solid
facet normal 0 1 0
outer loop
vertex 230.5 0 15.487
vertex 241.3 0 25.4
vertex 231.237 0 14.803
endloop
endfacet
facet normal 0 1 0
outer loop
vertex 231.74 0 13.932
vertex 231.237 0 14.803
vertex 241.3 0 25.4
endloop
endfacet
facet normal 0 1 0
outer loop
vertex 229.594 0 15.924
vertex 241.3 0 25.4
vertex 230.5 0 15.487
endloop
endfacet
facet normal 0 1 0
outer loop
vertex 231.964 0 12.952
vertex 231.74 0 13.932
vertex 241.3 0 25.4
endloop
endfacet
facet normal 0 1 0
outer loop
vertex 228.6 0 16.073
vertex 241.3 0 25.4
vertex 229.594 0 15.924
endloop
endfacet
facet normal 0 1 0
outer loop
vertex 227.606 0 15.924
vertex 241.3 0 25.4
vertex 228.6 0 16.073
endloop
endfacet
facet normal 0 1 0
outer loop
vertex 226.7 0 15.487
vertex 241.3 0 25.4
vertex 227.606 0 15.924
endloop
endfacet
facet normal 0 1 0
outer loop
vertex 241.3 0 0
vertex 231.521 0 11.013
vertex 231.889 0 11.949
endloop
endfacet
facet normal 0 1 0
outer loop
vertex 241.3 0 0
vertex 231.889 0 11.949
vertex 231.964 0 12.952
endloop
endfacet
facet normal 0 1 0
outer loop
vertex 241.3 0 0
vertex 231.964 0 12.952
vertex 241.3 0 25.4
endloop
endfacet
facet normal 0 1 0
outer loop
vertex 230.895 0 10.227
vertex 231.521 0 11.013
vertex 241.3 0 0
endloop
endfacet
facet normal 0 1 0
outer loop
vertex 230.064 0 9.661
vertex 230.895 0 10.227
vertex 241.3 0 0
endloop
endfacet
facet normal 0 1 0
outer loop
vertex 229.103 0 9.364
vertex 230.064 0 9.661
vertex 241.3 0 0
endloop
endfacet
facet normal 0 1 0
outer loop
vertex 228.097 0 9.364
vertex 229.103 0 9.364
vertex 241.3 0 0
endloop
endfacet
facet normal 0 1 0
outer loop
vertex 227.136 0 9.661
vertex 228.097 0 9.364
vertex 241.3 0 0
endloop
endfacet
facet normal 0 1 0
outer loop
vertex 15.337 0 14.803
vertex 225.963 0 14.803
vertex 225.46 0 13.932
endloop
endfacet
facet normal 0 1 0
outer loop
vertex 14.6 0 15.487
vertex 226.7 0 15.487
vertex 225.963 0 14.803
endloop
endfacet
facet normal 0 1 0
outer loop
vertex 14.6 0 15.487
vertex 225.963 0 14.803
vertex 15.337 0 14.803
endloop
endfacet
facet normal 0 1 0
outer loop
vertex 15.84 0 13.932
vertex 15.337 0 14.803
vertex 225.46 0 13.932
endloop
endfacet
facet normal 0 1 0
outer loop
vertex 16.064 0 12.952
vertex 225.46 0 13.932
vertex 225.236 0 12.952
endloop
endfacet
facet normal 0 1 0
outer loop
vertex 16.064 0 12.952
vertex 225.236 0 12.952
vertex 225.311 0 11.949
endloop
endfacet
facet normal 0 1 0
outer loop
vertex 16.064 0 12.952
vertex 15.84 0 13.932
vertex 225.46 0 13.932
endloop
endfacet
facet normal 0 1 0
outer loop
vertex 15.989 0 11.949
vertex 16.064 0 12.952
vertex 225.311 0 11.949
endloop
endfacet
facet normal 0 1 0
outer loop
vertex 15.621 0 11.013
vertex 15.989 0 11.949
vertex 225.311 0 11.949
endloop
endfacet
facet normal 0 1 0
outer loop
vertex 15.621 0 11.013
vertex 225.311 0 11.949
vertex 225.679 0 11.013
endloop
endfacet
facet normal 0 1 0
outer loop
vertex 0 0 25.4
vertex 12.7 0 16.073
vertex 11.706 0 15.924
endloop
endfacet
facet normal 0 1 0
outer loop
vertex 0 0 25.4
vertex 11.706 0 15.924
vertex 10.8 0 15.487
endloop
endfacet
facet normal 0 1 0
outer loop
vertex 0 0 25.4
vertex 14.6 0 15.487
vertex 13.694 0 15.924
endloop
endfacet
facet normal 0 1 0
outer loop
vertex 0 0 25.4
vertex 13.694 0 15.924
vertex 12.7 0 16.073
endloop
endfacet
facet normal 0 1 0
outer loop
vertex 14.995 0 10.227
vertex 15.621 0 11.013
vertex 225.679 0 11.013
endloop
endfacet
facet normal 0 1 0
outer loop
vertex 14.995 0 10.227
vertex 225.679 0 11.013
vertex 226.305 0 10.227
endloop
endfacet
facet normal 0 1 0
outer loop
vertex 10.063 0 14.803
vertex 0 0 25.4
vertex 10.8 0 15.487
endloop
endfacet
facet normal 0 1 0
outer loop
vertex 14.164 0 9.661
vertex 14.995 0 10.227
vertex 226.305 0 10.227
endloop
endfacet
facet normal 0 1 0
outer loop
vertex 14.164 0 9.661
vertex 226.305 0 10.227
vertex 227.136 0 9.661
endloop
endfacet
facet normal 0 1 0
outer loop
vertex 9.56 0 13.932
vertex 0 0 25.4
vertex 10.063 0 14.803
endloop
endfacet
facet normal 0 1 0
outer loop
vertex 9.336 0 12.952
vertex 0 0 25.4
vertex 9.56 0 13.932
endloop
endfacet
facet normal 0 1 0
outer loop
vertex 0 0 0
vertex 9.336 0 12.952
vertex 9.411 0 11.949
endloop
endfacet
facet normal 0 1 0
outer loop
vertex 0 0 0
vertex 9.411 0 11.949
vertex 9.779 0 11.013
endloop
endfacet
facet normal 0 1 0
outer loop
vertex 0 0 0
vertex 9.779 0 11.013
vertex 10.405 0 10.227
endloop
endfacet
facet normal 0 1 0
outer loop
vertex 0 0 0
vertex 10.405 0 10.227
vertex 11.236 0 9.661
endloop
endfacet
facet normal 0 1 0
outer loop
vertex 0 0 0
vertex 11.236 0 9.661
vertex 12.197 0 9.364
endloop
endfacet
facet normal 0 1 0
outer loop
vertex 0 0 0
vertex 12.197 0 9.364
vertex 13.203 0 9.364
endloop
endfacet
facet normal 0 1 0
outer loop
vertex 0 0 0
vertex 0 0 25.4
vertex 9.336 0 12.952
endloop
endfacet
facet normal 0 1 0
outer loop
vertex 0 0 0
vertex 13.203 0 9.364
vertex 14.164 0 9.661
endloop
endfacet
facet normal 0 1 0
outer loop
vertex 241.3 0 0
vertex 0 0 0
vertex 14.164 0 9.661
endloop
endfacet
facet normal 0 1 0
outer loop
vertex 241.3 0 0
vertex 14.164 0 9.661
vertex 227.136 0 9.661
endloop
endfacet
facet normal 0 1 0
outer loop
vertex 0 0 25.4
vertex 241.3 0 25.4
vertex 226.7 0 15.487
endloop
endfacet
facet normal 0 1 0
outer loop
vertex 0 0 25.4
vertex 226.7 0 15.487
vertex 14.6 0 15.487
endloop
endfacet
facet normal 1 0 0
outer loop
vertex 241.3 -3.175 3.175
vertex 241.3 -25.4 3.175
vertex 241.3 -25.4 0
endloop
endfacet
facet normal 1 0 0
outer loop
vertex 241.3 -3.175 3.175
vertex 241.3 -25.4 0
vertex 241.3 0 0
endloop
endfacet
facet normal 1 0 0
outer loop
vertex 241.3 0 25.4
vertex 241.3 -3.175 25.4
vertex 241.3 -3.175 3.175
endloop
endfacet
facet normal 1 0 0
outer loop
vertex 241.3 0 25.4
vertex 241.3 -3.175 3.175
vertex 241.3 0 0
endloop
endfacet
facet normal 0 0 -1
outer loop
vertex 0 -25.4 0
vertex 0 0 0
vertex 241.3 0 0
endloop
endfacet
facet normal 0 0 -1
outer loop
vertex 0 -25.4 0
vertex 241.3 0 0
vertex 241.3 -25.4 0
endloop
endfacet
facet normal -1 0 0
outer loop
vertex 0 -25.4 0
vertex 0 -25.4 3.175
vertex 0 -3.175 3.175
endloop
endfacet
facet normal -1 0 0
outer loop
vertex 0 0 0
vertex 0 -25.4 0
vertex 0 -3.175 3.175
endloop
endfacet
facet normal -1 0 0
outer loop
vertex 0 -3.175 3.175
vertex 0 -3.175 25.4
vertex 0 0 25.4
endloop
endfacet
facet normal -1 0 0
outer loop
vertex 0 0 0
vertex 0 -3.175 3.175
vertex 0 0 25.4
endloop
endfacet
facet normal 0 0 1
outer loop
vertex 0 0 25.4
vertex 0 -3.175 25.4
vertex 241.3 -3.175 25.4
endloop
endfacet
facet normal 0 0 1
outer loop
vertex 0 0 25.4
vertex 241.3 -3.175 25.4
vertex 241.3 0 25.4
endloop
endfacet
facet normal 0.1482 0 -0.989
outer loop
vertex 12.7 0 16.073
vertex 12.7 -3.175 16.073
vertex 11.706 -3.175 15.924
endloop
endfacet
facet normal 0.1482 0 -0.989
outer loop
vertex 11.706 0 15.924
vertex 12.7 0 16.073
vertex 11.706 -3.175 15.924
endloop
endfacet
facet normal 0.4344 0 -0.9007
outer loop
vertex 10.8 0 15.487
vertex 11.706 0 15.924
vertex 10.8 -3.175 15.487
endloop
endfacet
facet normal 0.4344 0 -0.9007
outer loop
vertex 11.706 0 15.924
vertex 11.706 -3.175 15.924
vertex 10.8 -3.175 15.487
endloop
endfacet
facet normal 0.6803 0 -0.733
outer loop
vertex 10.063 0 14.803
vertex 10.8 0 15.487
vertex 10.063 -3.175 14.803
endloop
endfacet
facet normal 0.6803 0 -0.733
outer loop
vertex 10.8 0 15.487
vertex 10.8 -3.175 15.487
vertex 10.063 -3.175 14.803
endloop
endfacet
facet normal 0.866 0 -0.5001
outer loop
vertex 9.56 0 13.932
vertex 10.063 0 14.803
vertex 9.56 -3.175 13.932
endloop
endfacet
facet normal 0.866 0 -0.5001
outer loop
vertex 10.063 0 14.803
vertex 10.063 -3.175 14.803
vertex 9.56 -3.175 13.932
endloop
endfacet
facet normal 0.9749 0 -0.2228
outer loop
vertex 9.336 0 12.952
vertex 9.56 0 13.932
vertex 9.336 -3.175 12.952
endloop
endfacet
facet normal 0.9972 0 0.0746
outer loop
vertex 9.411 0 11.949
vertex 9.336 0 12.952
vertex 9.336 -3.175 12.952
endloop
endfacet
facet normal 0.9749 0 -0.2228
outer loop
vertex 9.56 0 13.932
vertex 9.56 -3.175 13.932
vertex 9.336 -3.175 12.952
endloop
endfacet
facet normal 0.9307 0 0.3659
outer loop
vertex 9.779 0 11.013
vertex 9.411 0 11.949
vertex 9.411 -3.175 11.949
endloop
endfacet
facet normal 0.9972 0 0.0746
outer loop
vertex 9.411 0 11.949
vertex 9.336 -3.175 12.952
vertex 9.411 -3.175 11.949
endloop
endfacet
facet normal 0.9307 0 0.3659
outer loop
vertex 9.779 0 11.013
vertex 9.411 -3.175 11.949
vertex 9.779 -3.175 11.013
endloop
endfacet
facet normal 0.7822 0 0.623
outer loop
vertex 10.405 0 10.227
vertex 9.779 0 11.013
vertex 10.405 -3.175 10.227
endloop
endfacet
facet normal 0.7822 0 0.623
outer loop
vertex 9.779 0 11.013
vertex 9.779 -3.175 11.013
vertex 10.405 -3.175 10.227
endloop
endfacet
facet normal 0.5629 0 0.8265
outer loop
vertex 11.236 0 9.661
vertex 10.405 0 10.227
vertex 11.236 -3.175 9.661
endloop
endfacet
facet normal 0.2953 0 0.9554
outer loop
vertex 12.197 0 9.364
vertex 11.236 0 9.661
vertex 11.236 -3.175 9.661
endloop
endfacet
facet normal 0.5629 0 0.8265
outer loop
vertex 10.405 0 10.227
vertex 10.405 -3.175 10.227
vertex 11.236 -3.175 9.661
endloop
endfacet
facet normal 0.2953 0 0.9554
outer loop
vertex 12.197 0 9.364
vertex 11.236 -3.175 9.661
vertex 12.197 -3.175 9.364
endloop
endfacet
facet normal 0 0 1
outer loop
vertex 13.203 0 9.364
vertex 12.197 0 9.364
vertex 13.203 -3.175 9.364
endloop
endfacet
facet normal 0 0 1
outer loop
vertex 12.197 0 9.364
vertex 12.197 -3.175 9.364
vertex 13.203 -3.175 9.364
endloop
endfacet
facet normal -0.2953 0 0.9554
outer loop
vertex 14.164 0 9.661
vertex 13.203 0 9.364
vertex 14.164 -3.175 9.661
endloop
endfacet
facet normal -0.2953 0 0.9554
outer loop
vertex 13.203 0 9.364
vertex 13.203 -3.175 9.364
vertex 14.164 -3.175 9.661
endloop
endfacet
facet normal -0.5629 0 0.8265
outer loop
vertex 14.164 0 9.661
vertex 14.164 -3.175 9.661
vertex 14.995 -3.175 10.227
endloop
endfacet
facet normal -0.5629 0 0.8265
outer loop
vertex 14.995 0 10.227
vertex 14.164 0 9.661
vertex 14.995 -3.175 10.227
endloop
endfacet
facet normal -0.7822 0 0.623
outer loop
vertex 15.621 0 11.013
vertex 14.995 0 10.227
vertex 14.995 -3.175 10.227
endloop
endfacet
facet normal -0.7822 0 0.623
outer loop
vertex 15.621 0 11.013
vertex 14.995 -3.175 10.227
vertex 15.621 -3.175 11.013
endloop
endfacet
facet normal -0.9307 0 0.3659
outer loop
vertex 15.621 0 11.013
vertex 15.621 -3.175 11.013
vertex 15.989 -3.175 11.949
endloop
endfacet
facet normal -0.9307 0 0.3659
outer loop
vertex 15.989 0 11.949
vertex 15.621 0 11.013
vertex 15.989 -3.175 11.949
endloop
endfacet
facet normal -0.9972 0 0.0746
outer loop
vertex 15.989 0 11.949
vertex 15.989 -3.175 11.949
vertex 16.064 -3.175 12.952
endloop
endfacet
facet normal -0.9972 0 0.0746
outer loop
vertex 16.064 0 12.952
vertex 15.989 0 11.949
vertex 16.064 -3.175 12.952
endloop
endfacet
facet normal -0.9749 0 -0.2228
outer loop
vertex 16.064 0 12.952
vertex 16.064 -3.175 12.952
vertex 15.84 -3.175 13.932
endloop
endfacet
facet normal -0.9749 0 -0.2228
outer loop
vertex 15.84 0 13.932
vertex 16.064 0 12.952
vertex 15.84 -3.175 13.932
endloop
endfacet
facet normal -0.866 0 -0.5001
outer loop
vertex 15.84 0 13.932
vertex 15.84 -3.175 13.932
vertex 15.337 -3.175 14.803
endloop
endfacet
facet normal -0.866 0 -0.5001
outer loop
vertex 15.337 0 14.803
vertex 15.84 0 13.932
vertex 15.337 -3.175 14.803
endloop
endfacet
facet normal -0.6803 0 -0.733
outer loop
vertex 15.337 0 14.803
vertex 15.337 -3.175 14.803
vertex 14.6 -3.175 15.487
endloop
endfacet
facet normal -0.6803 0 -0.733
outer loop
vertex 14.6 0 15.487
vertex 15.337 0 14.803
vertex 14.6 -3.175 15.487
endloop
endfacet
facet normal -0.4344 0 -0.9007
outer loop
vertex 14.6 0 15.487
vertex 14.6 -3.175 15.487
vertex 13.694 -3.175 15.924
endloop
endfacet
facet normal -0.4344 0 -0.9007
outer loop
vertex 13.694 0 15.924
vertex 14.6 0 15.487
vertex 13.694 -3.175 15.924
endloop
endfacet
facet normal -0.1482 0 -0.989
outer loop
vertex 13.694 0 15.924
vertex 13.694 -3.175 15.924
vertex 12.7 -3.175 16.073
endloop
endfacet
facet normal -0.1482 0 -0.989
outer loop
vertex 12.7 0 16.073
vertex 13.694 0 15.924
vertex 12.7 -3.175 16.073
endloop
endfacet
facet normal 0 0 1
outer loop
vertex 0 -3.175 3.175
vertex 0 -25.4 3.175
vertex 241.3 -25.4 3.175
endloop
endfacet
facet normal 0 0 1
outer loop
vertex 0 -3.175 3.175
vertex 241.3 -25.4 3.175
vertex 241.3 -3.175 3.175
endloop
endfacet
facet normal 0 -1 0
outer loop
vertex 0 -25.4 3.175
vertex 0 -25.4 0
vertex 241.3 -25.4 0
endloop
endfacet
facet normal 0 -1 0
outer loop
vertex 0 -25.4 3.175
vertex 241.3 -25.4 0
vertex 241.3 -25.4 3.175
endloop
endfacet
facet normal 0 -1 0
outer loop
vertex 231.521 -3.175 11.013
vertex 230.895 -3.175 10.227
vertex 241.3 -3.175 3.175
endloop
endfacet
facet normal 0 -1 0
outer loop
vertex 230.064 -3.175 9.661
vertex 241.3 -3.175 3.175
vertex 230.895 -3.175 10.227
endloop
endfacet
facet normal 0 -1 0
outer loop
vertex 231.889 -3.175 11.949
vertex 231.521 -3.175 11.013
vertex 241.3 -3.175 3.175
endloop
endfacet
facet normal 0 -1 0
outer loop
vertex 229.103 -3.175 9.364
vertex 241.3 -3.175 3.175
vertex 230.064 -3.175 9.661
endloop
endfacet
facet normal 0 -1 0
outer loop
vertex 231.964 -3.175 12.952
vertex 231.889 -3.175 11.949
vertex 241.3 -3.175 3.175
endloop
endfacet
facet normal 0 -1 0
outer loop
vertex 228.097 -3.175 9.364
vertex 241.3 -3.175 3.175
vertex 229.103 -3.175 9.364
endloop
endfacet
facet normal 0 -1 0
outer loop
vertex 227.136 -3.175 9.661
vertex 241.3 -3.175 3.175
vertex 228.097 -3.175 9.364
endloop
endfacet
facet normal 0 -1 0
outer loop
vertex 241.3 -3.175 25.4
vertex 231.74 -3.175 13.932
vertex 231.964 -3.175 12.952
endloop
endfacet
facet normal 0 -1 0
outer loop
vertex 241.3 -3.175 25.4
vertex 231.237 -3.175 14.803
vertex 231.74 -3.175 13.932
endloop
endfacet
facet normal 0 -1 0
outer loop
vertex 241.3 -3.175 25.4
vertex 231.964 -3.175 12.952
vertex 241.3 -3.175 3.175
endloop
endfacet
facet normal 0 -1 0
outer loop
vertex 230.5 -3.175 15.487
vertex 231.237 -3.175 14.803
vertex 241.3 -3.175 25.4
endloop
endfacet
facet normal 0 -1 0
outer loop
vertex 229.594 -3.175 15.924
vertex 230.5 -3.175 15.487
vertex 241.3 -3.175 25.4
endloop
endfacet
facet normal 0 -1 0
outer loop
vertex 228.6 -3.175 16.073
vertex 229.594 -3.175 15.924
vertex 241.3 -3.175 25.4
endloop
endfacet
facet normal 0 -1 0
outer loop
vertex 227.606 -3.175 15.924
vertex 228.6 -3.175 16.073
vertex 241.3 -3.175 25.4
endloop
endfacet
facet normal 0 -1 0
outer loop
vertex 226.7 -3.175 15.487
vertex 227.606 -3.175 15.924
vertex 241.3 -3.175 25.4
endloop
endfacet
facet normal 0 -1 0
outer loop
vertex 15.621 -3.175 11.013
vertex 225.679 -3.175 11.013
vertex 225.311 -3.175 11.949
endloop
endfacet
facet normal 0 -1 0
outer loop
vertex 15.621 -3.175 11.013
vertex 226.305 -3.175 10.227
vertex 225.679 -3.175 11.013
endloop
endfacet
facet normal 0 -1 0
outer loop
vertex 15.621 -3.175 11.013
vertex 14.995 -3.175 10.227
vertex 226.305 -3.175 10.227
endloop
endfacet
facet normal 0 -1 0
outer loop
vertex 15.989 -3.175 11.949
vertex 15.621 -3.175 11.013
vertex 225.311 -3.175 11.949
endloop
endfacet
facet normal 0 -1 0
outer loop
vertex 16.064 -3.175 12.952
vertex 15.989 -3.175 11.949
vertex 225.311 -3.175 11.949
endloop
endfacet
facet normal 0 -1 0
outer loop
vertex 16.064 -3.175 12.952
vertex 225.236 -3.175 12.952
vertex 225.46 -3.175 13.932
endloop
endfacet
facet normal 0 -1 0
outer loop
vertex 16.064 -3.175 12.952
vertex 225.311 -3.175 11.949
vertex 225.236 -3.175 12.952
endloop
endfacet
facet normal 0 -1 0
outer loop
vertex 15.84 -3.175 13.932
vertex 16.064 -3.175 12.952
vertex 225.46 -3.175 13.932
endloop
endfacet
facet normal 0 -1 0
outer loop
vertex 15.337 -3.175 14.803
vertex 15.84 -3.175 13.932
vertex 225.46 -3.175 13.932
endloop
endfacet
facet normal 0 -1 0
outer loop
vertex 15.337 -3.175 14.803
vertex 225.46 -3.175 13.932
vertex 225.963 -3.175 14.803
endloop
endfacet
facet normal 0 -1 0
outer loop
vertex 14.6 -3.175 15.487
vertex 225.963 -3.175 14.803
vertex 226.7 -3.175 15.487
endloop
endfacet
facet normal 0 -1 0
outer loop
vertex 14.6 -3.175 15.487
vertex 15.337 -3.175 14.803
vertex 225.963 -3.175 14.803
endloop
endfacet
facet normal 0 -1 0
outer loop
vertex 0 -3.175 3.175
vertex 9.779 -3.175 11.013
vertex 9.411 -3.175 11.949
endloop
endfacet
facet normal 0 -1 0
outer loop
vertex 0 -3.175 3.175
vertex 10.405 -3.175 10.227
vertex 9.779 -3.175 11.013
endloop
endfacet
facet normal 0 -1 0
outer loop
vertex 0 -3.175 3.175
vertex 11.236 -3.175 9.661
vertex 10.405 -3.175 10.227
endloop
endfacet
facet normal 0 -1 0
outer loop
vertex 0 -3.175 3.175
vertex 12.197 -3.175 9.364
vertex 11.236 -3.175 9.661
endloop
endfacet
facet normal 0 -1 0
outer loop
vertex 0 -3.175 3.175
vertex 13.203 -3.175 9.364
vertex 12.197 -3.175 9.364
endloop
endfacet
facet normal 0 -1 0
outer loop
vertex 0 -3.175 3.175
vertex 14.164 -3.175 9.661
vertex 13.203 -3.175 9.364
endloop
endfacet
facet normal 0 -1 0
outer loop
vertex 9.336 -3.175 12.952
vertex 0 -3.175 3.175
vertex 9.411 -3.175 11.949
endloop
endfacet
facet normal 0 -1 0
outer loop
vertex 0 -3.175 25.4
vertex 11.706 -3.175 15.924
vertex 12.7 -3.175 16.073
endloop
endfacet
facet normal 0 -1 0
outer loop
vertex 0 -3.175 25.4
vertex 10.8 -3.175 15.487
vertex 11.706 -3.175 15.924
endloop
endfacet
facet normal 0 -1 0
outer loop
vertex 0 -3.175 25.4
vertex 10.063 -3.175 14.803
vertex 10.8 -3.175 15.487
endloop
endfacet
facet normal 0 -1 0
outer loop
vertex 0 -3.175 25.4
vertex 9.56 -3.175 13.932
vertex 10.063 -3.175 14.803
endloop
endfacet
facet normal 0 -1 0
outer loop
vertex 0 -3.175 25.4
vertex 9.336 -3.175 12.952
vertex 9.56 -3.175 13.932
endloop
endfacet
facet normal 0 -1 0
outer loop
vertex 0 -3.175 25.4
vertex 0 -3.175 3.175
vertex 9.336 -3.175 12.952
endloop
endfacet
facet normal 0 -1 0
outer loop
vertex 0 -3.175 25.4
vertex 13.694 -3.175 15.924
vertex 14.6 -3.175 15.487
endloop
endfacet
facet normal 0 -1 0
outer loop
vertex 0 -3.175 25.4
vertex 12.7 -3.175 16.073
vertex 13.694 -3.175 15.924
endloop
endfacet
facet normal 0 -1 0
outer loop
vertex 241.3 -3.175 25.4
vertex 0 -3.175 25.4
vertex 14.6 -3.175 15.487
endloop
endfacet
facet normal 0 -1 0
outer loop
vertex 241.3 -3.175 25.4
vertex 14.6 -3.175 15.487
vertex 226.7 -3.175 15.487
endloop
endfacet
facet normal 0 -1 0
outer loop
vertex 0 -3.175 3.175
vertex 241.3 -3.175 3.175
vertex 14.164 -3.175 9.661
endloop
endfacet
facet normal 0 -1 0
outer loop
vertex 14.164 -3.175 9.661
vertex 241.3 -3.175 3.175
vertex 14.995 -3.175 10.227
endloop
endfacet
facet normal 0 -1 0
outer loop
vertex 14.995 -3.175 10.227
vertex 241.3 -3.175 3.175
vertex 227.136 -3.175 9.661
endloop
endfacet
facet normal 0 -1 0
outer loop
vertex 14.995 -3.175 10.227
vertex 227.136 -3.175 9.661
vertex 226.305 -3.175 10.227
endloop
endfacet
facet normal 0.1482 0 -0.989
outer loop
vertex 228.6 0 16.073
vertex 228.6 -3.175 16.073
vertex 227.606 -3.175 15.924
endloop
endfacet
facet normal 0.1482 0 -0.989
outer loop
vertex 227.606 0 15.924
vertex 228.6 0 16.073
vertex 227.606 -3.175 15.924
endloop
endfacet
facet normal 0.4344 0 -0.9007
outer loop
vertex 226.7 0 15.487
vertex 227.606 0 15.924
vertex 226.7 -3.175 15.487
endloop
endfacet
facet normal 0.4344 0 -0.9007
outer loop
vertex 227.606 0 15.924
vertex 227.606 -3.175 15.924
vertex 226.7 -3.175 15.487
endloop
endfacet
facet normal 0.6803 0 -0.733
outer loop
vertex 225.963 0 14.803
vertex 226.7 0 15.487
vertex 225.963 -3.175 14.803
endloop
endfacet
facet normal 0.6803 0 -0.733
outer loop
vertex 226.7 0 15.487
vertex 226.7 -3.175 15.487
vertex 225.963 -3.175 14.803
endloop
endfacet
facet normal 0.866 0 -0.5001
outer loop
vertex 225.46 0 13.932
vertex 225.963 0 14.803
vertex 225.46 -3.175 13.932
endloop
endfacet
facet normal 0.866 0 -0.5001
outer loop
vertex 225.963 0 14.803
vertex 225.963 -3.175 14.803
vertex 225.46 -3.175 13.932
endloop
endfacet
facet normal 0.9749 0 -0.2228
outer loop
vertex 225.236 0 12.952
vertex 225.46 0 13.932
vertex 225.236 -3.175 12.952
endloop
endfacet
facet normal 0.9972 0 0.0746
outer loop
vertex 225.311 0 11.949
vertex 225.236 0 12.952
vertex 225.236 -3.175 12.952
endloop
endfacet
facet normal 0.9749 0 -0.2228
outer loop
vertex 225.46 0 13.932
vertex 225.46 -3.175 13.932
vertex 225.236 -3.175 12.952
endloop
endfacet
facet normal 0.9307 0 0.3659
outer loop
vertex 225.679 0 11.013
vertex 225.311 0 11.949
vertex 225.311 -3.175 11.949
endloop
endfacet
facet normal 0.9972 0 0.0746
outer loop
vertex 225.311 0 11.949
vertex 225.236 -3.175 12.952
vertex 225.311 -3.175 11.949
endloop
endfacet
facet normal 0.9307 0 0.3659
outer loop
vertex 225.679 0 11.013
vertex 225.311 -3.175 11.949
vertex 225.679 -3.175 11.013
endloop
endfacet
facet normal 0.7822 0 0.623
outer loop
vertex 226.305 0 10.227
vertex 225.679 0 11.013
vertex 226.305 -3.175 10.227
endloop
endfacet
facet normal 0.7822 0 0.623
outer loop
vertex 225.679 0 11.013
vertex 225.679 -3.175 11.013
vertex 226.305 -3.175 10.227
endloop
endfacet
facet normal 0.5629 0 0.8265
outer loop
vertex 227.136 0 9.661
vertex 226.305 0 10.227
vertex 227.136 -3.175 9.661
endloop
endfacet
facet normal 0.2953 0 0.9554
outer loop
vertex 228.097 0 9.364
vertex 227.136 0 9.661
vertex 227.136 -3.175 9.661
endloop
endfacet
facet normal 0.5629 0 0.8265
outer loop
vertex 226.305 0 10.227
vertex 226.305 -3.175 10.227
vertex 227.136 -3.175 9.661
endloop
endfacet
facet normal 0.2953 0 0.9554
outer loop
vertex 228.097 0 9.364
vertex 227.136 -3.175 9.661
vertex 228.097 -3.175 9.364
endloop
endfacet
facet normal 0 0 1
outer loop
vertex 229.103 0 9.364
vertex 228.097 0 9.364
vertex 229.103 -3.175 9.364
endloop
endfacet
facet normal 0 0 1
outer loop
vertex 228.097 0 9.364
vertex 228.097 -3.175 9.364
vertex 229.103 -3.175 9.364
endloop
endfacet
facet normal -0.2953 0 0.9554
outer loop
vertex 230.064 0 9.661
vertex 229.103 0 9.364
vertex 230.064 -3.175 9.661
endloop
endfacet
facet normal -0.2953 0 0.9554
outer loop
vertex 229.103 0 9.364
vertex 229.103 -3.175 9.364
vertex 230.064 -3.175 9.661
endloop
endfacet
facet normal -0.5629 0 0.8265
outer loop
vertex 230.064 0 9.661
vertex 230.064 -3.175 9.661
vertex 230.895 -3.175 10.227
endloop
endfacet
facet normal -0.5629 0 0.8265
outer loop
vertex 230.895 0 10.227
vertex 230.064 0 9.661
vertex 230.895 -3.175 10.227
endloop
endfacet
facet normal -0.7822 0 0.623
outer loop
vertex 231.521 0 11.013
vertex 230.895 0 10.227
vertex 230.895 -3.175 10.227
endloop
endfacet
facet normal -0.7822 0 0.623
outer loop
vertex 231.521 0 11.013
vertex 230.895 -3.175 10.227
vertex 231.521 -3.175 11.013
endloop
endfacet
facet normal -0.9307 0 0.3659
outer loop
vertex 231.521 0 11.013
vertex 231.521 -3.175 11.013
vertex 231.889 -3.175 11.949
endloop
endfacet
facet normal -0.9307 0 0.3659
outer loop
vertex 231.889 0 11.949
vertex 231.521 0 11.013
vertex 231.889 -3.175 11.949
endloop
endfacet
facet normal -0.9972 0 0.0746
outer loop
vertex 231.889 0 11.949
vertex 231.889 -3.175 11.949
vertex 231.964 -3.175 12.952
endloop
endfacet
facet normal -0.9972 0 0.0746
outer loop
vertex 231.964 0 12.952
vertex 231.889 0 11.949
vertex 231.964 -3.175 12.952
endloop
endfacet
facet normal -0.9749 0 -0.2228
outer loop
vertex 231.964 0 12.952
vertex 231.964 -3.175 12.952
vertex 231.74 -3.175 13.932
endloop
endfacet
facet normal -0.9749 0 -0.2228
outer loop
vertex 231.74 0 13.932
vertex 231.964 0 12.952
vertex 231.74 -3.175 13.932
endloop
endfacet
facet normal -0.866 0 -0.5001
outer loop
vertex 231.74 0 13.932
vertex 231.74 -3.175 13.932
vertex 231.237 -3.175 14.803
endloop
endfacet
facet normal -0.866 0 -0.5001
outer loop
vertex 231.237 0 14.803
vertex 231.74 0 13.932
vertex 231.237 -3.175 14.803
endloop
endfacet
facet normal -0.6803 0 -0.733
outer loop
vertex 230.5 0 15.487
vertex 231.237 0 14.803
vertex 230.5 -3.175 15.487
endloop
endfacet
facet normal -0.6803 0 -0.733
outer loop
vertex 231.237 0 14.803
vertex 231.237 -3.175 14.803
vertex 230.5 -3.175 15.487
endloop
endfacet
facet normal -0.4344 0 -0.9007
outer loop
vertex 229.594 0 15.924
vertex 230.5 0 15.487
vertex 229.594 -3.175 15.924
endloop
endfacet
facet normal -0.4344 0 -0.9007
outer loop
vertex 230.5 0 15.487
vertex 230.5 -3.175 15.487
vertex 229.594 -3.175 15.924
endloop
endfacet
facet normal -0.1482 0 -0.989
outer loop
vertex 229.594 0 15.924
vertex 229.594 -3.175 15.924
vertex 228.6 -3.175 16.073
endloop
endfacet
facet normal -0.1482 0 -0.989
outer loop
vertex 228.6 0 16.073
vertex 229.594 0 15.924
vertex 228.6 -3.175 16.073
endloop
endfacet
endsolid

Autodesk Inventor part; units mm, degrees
ref_plane "YZ Plane" through (0, 0, 0) normal (1, 0, 0) x (0, 1, 0)
ref_plane "XZ Plane" through (0, 0, 0) normal (0, 1, 0) x (-1, 0, 0)
ref_plane "XY Plane" through (0, 0, 0) normal (0, 0, 1) x (1, 0, 0)
sketch "Sketch1" plane through (0, 0, 0) normal (1, 0, 0) x (0, 1, 0)
  line L0 (0, 0) -> (-3.175, 0)
  line L1 (-3.175, 0) -> (-3.175, 25.4)
  line L2 (-3.175, 25.4) -> (0, 25.4)
  line L3 (0, 25.4) -> (0, 0)
  line L4 (0, 0) -> (-25.4, 0)
  line L5 (-25.4, 0) -> (-25.4, 3.175)
  line L6 (-25.4, 3.175) -> (0, 3.175)
  line L7 (0, 3.175) -> (0, 0)
  dimension "d0" = 3.175
  dimension "d1" = 25.4
  dimension "d2" = 25.4
  dimension "d3" = 3.175
extrude "Extrusion1" add sketch "Sketch1" along normal blind 241.3
sketch "Sketch2" plane through (0, 0, 25.4) normal (0, 1, 0) x (1, 0, 0)
  line L0 (0, 25.4) -> (0, 0) projected
  line L1 (0, 0) -> (241.3, 0) projected
  line L2 (241.3, 25.4) -> (241.3, 0) projected
  line L3 (0, 25.4) -> (241.3, 25.4) projected
  point P0 (228.6, 12.7)
  point P1 (12.7, 12.7)
  dimension "d6" = 12.7
  dimension "d7" = 12.7
  dimension "d8" = 12.7
  dimension "d9" = 228.6
hole "Hole1" at (228.6, 0, 12.7) at (12.7, 0, 12.7) direction (0, -1, 0) diameter 6.7469 end through all
properties part number "front slider guard" material "Aluminum 6061"
